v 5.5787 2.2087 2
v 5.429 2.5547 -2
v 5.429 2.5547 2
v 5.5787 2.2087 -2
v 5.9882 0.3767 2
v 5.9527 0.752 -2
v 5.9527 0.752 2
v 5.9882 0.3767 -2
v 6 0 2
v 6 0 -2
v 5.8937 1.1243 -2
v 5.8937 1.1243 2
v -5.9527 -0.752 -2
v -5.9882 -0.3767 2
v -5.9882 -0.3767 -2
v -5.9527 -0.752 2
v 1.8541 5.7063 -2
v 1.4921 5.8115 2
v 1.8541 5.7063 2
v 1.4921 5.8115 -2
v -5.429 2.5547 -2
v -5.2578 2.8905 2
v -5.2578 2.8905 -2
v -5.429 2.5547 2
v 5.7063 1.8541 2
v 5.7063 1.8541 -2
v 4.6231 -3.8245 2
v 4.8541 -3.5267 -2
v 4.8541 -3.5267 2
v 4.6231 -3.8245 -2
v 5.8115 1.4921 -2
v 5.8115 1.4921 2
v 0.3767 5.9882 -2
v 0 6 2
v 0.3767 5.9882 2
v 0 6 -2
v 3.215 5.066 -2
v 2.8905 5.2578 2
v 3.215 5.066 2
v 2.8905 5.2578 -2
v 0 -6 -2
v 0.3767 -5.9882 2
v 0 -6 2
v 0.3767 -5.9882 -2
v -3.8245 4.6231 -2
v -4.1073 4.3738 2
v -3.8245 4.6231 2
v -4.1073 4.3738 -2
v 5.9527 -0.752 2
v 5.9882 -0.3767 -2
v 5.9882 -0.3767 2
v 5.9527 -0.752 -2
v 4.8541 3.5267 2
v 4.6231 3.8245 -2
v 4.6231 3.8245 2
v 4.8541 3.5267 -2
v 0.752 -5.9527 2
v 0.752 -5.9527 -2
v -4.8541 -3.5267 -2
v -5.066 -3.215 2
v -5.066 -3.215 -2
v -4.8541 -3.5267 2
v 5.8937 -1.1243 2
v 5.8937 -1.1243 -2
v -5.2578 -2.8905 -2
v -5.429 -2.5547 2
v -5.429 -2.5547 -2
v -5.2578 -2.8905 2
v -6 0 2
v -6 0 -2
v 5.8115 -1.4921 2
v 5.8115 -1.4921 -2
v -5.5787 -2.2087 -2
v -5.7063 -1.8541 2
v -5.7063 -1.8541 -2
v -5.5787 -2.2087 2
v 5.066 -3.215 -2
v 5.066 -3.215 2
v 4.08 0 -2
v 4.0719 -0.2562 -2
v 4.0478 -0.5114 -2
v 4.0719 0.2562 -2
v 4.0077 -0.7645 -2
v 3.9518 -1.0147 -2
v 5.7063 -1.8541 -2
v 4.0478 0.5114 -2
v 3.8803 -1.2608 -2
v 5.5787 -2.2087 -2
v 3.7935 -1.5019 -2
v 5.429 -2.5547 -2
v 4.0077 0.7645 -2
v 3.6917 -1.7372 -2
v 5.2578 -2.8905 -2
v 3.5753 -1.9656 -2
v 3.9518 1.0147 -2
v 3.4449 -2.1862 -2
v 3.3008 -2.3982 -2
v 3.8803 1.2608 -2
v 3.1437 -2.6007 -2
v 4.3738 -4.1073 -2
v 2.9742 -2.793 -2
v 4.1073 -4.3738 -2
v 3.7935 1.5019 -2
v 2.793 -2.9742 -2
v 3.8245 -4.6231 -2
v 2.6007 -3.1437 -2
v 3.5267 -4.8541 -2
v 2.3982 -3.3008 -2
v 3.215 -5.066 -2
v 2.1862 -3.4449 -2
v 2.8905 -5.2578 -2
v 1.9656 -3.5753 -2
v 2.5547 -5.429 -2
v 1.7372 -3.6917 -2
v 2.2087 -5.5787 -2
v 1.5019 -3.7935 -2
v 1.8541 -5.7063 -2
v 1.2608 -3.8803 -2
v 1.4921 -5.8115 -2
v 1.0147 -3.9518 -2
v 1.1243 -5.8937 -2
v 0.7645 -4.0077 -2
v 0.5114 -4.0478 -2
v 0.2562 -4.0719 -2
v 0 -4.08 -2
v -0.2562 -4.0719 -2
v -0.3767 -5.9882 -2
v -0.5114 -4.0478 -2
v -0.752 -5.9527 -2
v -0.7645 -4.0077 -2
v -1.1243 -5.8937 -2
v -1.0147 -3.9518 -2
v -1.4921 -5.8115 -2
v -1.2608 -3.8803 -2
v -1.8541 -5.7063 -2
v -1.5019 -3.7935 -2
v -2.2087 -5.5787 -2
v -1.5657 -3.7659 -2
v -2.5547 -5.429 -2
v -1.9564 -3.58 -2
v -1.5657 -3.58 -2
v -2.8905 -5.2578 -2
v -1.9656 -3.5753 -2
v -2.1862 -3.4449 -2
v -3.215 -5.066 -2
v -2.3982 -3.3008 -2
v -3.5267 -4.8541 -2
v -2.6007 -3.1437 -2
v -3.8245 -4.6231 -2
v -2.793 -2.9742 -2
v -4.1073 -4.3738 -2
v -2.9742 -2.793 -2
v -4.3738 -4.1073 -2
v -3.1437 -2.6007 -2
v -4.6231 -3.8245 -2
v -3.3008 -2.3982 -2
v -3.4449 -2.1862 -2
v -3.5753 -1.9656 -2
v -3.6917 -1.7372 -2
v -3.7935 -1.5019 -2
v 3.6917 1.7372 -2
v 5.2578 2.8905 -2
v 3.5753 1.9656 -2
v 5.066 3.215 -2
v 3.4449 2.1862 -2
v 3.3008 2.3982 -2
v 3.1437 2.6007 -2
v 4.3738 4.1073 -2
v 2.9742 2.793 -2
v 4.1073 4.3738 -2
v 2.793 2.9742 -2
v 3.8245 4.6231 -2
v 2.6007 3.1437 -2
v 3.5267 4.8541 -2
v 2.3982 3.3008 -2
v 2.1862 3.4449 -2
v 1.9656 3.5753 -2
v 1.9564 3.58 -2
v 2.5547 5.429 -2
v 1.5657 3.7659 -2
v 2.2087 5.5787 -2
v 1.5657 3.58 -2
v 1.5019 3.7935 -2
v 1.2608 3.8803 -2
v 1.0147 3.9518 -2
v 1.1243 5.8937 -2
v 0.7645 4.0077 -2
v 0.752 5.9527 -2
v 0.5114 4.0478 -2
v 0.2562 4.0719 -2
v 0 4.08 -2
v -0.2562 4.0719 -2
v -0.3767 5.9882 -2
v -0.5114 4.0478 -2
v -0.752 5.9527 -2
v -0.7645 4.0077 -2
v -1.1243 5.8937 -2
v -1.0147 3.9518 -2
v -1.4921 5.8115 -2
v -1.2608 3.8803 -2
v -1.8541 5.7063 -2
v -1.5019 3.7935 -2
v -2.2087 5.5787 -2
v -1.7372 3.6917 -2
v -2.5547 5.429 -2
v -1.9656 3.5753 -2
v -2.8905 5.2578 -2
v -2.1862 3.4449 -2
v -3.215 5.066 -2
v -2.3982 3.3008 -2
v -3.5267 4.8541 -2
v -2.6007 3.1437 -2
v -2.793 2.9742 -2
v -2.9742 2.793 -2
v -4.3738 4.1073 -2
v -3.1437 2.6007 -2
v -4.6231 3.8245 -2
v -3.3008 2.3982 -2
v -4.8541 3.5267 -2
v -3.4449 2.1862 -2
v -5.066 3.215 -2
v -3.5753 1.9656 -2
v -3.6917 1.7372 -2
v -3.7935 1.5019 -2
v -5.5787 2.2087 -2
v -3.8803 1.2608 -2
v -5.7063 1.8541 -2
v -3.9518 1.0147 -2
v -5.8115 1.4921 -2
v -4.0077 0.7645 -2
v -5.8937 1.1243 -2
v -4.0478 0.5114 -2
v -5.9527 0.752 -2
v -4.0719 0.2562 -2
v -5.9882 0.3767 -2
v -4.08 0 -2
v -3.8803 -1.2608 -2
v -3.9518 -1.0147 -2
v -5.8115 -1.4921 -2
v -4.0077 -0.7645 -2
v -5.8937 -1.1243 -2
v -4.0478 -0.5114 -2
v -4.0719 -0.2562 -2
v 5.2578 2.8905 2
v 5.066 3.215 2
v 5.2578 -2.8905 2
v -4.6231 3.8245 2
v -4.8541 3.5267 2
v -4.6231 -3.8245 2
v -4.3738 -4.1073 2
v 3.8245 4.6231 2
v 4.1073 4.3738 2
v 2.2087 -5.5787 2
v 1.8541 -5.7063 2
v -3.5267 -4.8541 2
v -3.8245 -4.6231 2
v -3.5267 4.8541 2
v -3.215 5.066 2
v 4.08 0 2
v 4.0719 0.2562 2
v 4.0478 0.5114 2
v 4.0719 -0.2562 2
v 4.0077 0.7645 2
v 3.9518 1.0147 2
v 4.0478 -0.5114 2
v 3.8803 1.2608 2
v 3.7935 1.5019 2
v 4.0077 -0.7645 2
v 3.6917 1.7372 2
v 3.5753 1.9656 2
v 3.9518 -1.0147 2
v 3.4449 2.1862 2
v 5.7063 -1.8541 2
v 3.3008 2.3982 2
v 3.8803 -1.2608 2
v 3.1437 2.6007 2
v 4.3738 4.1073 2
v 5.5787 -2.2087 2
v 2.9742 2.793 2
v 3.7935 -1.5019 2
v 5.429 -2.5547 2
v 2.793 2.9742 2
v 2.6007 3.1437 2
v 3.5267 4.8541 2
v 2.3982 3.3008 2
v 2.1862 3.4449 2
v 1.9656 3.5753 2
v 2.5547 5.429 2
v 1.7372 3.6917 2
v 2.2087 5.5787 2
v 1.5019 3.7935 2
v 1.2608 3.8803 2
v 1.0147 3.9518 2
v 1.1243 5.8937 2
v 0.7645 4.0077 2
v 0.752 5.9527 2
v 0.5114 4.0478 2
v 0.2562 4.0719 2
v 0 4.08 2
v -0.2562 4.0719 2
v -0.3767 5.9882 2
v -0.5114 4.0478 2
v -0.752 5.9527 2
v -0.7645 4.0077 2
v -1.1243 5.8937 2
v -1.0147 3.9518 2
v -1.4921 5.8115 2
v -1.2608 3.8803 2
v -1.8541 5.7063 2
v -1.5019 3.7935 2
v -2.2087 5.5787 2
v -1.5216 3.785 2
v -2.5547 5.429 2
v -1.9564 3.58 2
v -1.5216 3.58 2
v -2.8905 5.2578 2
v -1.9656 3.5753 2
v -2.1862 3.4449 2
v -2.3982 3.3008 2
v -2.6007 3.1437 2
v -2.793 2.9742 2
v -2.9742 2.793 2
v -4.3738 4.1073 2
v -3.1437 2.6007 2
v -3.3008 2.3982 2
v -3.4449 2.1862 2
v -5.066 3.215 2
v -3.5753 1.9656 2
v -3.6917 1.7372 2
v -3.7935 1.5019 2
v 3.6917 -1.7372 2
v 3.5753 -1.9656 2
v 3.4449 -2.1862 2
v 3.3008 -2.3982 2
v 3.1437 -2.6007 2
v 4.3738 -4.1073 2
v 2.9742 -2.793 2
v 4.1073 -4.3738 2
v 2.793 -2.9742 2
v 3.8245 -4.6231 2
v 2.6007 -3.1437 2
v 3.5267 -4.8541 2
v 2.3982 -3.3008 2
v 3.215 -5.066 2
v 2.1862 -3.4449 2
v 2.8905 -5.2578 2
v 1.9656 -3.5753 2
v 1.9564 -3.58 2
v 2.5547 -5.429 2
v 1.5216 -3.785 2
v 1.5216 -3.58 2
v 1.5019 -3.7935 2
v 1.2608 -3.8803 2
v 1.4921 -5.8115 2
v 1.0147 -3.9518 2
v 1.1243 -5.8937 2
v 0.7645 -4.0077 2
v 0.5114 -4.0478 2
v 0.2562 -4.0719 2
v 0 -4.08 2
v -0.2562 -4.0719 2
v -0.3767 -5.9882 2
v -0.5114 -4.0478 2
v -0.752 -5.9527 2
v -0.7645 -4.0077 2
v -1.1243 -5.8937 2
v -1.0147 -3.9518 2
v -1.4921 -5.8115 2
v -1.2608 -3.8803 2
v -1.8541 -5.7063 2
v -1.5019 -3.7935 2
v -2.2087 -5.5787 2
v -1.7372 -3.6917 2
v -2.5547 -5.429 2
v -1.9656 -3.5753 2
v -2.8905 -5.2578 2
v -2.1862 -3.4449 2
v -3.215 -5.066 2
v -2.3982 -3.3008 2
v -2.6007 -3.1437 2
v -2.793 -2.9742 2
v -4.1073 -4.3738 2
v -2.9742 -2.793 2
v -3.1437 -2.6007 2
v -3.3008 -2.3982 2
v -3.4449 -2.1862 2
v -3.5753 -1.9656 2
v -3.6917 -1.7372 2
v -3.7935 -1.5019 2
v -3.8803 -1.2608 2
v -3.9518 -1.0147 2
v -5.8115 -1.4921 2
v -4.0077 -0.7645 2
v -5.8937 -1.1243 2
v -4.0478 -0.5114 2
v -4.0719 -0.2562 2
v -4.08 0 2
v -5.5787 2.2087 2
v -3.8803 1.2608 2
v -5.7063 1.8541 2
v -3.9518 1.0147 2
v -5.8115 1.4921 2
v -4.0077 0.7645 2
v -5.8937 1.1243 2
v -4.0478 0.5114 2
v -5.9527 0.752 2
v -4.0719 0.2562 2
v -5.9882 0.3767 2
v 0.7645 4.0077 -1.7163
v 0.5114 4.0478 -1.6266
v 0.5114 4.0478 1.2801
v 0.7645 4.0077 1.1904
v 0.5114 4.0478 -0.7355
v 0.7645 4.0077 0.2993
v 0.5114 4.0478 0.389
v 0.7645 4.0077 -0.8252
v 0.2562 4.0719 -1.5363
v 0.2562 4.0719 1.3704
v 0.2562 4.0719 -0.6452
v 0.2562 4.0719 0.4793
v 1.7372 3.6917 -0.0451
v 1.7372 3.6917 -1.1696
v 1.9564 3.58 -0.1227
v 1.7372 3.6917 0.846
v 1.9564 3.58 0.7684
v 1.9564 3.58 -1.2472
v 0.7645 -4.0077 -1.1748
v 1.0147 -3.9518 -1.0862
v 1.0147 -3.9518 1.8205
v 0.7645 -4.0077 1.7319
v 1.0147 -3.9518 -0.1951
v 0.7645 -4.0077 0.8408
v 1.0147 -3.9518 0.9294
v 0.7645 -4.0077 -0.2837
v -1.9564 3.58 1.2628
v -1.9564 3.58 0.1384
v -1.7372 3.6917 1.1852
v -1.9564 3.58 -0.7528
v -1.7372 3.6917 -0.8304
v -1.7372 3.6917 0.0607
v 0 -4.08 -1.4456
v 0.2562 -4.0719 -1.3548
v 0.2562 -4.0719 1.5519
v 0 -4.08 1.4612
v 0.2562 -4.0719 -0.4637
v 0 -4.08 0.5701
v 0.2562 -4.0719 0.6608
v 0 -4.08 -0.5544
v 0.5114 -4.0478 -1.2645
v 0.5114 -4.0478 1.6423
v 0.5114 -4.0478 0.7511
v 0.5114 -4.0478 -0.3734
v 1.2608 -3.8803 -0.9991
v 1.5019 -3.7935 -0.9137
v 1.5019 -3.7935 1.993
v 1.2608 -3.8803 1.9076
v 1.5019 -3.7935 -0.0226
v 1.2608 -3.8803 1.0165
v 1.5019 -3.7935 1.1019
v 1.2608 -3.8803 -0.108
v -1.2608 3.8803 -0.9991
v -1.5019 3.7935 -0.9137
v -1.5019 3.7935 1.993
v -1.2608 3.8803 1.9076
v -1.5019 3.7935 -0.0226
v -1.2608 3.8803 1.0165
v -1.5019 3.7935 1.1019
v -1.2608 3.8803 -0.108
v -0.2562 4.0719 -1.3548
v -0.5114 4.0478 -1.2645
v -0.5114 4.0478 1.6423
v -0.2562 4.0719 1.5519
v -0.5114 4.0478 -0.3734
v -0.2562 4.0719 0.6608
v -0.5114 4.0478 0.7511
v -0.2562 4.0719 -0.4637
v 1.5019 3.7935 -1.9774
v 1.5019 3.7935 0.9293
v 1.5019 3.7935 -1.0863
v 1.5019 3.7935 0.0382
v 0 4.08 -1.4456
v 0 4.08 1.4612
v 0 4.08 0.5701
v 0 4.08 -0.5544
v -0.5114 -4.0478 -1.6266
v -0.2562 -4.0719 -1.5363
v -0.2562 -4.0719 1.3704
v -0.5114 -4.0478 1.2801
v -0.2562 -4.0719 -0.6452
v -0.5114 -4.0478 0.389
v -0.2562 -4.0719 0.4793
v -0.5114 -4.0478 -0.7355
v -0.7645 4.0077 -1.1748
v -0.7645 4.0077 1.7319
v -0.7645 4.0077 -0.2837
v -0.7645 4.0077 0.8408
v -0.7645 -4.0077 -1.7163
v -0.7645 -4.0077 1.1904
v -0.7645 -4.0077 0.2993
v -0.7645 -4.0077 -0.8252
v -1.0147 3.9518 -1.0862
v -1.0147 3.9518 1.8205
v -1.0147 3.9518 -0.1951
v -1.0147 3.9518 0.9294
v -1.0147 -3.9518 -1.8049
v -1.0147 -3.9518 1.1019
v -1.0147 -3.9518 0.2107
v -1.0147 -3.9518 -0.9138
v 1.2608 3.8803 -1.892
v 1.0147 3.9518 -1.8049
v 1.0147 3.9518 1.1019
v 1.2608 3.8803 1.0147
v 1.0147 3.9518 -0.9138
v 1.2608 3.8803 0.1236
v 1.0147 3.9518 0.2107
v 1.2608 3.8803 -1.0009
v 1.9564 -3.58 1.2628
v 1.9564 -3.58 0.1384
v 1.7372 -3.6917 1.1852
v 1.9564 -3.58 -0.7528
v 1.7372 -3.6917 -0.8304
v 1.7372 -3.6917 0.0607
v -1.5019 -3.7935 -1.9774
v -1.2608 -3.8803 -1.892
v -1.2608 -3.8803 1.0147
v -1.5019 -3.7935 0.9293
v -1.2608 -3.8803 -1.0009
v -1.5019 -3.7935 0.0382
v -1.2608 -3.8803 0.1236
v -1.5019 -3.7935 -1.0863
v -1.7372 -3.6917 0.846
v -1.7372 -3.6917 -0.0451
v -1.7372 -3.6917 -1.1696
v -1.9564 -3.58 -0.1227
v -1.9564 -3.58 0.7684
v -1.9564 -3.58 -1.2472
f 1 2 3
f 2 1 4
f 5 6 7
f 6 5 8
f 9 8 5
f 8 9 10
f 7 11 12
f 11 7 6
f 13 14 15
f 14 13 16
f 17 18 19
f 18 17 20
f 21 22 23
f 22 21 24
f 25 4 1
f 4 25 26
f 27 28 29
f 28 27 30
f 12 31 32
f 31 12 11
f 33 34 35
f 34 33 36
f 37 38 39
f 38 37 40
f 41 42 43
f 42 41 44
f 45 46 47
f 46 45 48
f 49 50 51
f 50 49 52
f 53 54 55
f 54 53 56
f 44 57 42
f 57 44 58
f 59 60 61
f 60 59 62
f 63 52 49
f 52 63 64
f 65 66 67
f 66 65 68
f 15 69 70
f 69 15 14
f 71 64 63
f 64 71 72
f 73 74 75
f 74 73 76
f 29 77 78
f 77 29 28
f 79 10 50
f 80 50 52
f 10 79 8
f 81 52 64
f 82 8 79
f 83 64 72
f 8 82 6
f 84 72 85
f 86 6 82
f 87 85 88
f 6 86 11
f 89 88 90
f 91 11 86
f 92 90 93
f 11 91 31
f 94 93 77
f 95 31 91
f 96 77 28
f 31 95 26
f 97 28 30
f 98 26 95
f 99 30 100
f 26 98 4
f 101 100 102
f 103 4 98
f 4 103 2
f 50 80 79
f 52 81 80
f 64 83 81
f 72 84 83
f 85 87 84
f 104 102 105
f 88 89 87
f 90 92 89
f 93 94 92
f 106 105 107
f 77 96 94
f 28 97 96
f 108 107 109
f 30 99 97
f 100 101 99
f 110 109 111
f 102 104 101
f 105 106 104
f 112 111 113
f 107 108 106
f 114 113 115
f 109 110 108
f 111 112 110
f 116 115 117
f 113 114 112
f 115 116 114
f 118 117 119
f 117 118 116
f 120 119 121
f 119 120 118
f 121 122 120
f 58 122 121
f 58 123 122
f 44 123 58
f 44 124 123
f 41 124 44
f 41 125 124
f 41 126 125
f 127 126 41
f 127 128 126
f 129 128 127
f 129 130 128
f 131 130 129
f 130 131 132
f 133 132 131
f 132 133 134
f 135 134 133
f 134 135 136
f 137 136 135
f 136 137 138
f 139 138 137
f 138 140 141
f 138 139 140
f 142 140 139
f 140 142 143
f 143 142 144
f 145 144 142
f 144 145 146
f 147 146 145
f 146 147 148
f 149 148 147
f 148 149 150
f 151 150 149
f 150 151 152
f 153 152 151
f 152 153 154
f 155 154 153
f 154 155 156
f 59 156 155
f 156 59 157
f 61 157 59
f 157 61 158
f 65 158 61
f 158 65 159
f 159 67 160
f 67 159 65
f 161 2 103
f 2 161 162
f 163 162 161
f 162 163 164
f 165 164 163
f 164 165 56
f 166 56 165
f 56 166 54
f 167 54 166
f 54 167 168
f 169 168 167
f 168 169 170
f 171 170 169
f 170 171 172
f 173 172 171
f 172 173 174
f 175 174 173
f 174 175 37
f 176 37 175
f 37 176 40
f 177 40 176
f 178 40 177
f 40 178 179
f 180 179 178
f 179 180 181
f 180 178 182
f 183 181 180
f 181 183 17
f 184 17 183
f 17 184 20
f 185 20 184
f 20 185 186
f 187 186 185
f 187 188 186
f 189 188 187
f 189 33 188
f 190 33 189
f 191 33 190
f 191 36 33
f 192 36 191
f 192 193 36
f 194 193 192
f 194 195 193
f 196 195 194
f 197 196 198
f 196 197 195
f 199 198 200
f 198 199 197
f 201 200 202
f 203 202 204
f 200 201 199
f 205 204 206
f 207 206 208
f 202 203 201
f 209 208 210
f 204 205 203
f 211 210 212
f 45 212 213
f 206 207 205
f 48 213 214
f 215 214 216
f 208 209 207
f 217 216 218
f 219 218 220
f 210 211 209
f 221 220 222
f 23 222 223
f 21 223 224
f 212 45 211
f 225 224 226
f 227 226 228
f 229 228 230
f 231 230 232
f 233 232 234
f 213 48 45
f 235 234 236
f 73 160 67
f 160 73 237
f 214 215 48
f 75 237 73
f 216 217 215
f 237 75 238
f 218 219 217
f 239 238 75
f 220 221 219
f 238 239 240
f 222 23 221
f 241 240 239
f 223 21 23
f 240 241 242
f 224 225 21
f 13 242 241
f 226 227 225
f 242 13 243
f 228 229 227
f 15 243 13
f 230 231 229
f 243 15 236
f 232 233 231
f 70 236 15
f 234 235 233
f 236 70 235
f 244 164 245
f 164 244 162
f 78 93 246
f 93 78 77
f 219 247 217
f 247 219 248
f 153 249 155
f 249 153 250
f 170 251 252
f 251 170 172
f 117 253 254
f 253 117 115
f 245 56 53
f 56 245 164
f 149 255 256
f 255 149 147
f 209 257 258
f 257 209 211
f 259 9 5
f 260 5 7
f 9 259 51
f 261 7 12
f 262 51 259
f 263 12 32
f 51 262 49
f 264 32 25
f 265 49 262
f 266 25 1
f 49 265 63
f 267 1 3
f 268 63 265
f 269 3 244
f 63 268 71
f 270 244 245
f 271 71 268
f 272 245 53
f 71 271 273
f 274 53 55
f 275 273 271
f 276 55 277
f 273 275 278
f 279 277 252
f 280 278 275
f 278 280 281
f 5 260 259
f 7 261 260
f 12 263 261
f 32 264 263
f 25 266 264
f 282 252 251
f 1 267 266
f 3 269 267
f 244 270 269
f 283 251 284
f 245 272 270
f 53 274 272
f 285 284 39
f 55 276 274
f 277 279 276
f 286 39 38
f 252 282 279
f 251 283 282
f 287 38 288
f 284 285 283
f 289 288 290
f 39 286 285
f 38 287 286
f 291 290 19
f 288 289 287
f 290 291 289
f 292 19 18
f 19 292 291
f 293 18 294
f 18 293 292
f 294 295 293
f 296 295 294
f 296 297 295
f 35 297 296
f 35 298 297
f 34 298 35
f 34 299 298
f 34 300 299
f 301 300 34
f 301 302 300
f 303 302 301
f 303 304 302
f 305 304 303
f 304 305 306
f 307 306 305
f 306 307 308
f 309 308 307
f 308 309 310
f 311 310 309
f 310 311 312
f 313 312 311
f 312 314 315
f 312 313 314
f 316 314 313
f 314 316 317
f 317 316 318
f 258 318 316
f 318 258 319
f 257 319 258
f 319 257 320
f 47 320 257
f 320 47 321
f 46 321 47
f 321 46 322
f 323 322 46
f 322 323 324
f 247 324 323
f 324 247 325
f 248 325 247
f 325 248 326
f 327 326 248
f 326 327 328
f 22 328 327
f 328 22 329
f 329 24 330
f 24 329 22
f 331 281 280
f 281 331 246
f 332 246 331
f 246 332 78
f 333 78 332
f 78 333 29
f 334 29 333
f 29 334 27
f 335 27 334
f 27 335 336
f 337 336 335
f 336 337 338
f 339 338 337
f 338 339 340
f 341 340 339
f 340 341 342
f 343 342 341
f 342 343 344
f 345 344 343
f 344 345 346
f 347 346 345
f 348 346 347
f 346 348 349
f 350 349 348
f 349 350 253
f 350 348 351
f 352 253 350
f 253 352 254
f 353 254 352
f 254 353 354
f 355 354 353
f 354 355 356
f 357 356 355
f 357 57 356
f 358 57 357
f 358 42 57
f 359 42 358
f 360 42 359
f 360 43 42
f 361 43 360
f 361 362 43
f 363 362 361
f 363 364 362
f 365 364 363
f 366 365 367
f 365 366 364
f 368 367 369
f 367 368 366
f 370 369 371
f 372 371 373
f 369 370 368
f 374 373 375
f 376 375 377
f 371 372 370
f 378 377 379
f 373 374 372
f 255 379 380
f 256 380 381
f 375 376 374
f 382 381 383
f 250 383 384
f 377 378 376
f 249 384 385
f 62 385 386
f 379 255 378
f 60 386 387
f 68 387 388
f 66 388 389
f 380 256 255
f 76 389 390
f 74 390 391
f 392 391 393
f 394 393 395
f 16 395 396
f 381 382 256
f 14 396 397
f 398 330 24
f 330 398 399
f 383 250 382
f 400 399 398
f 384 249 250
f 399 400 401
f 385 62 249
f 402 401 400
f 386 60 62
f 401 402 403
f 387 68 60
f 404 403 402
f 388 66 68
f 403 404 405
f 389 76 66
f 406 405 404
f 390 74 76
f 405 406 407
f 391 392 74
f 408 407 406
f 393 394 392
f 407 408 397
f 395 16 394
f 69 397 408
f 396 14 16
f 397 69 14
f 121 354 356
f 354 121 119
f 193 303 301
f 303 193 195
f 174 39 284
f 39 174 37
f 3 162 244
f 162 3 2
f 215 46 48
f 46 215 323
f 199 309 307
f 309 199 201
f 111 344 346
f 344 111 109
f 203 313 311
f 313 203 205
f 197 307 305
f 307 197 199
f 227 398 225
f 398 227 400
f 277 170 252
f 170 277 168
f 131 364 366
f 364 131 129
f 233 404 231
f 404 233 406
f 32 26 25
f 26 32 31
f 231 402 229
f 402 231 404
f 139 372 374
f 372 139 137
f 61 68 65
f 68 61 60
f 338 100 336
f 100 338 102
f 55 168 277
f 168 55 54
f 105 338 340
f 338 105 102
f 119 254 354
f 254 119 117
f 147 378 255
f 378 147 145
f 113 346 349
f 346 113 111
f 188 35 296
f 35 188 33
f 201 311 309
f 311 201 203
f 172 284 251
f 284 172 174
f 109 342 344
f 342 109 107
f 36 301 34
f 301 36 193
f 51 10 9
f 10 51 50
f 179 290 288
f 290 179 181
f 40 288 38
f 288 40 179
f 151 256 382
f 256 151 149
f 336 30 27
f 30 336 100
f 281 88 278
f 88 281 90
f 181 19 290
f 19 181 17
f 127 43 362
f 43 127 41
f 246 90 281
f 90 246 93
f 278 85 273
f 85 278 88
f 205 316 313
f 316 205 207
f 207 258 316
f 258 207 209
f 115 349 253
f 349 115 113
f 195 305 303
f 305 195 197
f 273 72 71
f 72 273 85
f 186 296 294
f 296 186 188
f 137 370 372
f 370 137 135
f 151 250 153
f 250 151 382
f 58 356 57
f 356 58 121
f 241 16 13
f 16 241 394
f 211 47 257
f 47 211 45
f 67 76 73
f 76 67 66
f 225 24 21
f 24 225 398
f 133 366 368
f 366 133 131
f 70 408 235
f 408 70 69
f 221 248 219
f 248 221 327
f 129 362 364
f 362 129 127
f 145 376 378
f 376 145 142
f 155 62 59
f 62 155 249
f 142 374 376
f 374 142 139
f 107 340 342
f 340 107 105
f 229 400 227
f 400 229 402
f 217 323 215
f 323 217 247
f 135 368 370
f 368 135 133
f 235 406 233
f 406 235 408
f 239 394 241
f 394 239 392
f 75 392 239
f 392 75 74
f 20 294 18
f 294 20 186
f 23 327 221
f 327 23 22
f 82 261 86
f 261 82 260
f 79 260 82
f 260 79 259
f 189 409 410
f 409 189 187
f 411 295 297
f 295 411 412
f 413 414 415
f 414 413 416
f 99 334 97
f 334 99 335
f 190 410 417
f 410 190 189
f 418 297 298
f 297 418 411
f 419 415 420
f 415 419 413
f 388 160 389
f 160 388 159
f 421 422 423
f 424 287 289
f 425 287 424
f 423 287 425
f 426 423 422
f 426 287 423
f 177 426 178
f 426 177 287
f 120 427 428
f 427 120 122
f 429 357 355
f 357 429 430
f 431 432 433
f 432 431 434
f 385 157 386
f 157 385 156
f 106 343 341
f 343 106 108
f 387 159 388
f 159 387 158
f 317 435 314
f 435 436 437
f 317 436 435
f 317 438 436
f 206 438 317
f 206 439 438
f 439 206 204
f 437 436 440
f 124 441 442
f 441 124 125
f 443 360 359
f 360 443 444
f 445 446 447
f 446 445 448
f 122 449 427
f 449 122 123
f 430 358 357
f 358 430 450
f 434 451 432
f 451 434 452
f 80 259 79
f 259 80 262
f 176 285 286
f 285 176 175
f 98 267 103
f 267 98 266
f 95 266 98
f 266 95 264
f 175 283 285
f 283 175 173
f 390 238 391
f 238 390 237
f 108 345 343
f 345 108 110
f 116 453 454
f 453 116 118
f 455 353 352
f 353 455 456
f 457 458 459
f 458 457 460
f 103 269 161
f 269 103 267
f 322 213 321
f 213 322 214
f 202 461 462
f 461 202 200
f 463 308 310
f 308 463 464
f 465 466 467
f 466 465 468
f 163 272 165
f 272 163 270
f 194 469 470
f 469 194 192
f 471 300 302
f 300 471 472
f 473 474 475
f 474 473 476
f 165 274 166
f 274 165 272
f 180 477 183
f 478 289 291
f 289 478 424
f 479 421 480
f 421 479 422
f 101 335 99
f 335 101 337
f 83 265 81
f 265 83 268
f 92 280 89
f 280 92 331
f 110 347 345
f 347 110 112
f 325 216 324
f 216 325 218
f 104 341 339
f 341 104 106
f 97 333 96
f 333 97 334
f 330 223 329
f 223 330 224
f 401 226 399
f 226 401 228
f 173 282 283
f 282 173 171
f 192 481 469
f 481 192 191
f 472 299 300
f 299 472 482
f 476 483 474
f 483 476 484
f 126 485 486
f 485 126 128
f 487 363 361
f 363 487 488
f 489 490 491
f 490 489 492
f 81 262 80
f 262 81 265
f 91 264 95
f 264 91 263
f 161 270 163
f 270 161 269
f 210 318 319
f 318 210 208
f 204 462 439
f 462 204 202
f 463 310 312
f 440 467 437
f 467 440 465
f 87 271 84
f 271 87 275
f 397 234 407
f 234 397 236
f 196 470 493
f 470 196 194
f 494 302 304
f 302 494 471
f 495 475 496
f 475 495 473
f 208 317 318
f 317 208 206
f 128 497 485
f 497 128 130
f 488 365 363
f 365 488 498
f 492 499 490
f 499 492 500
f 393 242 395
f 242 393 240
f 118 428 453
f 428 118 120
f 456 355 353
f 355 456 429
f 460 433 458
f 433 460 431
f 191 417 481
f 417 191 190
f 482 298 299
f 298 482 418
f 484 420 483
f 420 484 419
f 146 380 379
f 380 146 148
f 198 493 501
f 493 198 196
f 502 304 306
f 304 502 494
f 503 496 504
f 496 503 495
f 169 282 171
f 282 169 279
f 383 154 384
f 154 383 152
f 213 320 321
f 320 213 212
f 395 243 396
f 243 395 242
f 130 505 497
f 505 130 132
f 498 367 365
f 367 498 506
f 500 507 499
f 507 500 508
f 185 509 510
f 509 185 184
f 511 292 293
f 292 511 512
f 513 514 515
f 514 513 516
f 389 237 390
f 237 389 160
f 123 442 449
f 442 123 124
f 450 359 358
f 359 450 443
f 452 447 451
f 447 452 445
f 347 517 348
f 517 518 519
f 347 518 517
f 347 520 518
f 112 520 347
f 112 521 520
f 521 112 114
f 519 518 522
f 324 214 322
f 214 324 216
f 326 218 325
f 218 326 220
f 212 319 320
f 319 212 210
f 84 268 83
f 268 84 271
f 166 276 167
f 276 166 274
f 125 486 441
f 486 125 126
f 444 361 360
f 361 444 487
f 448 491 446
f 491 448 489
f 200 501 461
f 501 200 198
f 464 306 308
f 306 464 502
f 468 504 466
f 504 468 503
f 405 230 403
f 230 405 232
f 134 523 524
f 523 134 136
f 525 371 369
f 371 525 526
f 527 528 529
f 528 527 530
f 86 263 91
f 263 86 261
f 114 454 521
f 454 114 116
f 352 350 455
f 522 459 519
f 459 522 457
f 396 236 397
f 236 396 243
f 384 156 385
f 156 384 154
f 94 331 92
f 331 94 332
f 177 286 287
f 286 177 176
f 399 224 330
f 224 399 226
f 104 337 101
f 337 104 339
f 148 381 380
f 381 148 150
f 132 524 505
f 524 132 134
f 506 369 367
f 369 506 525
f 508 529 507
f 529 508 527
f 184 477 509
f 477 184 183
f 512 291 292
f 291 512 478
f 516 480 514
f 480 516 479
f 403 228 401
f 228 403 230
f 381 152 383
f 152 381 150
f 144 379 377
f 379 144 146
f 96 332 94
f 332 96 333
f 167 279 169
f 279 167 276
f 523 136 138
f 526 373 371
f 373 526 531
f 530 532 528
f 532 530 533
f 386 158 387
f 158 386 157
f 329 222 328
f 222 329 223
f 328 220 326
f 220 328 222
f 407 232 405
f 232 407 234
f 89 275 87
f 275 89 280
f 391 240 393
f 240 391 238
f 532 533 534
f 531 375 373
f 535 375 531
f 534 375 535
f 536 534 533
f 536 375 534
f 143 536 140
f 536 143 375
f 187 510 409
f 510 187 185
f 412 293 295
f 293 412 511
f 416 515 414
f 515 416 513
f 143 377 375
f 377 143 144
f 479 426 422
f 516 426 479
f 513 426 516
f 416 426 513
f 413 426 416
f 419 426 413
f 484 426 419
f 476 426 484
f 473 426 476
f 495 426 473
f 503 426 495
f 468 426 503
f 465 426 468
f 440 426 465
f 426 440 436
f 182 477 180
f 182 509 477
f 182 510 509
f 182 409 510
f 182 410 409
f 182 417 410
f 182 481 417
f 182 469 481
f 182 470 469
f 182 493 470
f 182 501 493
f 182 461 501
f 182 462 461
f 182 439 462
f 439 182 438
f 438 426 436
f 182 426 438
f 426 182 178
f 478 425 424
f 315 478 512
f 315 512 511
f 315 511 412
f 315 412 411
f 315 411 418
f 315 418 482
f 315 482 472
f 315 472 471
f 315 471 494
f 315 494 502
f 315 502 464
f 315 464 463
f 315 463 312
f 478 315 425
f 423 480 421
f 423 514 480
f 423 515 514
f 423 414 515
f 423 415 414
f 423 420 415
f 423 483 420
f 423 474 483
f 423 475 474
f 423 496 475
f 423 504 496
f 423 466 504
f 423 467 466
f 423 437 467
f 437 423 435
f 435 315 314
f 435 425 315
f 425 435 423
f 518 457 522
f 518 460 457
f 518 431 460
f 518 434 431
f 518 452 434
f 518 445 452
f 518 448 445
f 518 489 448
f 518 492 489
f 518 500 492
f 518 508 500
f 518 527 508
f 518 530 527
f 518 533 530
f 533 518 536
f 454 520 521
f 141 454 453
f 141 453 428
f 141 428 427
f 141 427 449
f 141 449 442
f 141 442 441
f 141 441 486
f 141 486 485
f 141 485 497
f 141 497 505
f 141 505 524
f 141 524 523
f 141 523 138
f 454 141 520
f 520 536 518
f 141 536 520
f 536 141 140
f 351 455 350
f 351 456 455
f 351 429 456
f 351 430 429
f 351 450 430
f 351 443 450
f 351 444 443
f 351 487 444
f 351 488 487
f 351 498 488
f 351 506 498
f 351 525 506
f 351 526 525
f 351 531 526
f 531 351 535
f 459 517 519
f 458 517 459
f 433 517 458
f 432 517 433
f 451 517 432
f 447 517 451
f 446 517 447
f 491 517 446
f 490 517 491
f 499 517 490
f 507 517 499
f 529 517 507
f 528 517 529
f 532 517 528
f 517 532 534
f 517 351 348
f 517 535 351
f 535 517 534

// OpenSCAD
module grooves(t1, t2, angle, length, width, depth){
    for(i=[0:length]){
        let(dz=(t1+t2)/(sin(90-angle)),x=0,y=0,z=0)
        let()
        translate([x,y,z+dz*i])rotate([0,angle,0])cube([width,depth,t1],center=true);
    }
    
}


module ring(r1,r2,h){
    difference(){
    cylinder(r=r1,h=h, $fn=100,center=true);
        cylinder(r=r2,h=h*2, $fn=100,center=true);
    }
}

difference(){
    union(){
        ring(6,4.08,4);
        let(x=0,y=4.08,z=-1)
        translate([x,y,z])grooves(0.84, 1.06, 19.5, length=1, width=5, depth=1);
        let(x=0,y=-4.08,z=-1)
        translate([x,y,z])grooves(0.84, 1.06, -19.5, length=1, width=5, depth=1);
    }
    let(x=0,y=0,z=2.5)
    translate([x,y,z])cube([100,100,1],center=true);
    let(x=0,y=0,z=-2.5)
    translate([x,y,z])cube([100,100,1],center=true);
    
}
//translate([-2.5,+0.2,-5])cube([5,0.5,30]);
